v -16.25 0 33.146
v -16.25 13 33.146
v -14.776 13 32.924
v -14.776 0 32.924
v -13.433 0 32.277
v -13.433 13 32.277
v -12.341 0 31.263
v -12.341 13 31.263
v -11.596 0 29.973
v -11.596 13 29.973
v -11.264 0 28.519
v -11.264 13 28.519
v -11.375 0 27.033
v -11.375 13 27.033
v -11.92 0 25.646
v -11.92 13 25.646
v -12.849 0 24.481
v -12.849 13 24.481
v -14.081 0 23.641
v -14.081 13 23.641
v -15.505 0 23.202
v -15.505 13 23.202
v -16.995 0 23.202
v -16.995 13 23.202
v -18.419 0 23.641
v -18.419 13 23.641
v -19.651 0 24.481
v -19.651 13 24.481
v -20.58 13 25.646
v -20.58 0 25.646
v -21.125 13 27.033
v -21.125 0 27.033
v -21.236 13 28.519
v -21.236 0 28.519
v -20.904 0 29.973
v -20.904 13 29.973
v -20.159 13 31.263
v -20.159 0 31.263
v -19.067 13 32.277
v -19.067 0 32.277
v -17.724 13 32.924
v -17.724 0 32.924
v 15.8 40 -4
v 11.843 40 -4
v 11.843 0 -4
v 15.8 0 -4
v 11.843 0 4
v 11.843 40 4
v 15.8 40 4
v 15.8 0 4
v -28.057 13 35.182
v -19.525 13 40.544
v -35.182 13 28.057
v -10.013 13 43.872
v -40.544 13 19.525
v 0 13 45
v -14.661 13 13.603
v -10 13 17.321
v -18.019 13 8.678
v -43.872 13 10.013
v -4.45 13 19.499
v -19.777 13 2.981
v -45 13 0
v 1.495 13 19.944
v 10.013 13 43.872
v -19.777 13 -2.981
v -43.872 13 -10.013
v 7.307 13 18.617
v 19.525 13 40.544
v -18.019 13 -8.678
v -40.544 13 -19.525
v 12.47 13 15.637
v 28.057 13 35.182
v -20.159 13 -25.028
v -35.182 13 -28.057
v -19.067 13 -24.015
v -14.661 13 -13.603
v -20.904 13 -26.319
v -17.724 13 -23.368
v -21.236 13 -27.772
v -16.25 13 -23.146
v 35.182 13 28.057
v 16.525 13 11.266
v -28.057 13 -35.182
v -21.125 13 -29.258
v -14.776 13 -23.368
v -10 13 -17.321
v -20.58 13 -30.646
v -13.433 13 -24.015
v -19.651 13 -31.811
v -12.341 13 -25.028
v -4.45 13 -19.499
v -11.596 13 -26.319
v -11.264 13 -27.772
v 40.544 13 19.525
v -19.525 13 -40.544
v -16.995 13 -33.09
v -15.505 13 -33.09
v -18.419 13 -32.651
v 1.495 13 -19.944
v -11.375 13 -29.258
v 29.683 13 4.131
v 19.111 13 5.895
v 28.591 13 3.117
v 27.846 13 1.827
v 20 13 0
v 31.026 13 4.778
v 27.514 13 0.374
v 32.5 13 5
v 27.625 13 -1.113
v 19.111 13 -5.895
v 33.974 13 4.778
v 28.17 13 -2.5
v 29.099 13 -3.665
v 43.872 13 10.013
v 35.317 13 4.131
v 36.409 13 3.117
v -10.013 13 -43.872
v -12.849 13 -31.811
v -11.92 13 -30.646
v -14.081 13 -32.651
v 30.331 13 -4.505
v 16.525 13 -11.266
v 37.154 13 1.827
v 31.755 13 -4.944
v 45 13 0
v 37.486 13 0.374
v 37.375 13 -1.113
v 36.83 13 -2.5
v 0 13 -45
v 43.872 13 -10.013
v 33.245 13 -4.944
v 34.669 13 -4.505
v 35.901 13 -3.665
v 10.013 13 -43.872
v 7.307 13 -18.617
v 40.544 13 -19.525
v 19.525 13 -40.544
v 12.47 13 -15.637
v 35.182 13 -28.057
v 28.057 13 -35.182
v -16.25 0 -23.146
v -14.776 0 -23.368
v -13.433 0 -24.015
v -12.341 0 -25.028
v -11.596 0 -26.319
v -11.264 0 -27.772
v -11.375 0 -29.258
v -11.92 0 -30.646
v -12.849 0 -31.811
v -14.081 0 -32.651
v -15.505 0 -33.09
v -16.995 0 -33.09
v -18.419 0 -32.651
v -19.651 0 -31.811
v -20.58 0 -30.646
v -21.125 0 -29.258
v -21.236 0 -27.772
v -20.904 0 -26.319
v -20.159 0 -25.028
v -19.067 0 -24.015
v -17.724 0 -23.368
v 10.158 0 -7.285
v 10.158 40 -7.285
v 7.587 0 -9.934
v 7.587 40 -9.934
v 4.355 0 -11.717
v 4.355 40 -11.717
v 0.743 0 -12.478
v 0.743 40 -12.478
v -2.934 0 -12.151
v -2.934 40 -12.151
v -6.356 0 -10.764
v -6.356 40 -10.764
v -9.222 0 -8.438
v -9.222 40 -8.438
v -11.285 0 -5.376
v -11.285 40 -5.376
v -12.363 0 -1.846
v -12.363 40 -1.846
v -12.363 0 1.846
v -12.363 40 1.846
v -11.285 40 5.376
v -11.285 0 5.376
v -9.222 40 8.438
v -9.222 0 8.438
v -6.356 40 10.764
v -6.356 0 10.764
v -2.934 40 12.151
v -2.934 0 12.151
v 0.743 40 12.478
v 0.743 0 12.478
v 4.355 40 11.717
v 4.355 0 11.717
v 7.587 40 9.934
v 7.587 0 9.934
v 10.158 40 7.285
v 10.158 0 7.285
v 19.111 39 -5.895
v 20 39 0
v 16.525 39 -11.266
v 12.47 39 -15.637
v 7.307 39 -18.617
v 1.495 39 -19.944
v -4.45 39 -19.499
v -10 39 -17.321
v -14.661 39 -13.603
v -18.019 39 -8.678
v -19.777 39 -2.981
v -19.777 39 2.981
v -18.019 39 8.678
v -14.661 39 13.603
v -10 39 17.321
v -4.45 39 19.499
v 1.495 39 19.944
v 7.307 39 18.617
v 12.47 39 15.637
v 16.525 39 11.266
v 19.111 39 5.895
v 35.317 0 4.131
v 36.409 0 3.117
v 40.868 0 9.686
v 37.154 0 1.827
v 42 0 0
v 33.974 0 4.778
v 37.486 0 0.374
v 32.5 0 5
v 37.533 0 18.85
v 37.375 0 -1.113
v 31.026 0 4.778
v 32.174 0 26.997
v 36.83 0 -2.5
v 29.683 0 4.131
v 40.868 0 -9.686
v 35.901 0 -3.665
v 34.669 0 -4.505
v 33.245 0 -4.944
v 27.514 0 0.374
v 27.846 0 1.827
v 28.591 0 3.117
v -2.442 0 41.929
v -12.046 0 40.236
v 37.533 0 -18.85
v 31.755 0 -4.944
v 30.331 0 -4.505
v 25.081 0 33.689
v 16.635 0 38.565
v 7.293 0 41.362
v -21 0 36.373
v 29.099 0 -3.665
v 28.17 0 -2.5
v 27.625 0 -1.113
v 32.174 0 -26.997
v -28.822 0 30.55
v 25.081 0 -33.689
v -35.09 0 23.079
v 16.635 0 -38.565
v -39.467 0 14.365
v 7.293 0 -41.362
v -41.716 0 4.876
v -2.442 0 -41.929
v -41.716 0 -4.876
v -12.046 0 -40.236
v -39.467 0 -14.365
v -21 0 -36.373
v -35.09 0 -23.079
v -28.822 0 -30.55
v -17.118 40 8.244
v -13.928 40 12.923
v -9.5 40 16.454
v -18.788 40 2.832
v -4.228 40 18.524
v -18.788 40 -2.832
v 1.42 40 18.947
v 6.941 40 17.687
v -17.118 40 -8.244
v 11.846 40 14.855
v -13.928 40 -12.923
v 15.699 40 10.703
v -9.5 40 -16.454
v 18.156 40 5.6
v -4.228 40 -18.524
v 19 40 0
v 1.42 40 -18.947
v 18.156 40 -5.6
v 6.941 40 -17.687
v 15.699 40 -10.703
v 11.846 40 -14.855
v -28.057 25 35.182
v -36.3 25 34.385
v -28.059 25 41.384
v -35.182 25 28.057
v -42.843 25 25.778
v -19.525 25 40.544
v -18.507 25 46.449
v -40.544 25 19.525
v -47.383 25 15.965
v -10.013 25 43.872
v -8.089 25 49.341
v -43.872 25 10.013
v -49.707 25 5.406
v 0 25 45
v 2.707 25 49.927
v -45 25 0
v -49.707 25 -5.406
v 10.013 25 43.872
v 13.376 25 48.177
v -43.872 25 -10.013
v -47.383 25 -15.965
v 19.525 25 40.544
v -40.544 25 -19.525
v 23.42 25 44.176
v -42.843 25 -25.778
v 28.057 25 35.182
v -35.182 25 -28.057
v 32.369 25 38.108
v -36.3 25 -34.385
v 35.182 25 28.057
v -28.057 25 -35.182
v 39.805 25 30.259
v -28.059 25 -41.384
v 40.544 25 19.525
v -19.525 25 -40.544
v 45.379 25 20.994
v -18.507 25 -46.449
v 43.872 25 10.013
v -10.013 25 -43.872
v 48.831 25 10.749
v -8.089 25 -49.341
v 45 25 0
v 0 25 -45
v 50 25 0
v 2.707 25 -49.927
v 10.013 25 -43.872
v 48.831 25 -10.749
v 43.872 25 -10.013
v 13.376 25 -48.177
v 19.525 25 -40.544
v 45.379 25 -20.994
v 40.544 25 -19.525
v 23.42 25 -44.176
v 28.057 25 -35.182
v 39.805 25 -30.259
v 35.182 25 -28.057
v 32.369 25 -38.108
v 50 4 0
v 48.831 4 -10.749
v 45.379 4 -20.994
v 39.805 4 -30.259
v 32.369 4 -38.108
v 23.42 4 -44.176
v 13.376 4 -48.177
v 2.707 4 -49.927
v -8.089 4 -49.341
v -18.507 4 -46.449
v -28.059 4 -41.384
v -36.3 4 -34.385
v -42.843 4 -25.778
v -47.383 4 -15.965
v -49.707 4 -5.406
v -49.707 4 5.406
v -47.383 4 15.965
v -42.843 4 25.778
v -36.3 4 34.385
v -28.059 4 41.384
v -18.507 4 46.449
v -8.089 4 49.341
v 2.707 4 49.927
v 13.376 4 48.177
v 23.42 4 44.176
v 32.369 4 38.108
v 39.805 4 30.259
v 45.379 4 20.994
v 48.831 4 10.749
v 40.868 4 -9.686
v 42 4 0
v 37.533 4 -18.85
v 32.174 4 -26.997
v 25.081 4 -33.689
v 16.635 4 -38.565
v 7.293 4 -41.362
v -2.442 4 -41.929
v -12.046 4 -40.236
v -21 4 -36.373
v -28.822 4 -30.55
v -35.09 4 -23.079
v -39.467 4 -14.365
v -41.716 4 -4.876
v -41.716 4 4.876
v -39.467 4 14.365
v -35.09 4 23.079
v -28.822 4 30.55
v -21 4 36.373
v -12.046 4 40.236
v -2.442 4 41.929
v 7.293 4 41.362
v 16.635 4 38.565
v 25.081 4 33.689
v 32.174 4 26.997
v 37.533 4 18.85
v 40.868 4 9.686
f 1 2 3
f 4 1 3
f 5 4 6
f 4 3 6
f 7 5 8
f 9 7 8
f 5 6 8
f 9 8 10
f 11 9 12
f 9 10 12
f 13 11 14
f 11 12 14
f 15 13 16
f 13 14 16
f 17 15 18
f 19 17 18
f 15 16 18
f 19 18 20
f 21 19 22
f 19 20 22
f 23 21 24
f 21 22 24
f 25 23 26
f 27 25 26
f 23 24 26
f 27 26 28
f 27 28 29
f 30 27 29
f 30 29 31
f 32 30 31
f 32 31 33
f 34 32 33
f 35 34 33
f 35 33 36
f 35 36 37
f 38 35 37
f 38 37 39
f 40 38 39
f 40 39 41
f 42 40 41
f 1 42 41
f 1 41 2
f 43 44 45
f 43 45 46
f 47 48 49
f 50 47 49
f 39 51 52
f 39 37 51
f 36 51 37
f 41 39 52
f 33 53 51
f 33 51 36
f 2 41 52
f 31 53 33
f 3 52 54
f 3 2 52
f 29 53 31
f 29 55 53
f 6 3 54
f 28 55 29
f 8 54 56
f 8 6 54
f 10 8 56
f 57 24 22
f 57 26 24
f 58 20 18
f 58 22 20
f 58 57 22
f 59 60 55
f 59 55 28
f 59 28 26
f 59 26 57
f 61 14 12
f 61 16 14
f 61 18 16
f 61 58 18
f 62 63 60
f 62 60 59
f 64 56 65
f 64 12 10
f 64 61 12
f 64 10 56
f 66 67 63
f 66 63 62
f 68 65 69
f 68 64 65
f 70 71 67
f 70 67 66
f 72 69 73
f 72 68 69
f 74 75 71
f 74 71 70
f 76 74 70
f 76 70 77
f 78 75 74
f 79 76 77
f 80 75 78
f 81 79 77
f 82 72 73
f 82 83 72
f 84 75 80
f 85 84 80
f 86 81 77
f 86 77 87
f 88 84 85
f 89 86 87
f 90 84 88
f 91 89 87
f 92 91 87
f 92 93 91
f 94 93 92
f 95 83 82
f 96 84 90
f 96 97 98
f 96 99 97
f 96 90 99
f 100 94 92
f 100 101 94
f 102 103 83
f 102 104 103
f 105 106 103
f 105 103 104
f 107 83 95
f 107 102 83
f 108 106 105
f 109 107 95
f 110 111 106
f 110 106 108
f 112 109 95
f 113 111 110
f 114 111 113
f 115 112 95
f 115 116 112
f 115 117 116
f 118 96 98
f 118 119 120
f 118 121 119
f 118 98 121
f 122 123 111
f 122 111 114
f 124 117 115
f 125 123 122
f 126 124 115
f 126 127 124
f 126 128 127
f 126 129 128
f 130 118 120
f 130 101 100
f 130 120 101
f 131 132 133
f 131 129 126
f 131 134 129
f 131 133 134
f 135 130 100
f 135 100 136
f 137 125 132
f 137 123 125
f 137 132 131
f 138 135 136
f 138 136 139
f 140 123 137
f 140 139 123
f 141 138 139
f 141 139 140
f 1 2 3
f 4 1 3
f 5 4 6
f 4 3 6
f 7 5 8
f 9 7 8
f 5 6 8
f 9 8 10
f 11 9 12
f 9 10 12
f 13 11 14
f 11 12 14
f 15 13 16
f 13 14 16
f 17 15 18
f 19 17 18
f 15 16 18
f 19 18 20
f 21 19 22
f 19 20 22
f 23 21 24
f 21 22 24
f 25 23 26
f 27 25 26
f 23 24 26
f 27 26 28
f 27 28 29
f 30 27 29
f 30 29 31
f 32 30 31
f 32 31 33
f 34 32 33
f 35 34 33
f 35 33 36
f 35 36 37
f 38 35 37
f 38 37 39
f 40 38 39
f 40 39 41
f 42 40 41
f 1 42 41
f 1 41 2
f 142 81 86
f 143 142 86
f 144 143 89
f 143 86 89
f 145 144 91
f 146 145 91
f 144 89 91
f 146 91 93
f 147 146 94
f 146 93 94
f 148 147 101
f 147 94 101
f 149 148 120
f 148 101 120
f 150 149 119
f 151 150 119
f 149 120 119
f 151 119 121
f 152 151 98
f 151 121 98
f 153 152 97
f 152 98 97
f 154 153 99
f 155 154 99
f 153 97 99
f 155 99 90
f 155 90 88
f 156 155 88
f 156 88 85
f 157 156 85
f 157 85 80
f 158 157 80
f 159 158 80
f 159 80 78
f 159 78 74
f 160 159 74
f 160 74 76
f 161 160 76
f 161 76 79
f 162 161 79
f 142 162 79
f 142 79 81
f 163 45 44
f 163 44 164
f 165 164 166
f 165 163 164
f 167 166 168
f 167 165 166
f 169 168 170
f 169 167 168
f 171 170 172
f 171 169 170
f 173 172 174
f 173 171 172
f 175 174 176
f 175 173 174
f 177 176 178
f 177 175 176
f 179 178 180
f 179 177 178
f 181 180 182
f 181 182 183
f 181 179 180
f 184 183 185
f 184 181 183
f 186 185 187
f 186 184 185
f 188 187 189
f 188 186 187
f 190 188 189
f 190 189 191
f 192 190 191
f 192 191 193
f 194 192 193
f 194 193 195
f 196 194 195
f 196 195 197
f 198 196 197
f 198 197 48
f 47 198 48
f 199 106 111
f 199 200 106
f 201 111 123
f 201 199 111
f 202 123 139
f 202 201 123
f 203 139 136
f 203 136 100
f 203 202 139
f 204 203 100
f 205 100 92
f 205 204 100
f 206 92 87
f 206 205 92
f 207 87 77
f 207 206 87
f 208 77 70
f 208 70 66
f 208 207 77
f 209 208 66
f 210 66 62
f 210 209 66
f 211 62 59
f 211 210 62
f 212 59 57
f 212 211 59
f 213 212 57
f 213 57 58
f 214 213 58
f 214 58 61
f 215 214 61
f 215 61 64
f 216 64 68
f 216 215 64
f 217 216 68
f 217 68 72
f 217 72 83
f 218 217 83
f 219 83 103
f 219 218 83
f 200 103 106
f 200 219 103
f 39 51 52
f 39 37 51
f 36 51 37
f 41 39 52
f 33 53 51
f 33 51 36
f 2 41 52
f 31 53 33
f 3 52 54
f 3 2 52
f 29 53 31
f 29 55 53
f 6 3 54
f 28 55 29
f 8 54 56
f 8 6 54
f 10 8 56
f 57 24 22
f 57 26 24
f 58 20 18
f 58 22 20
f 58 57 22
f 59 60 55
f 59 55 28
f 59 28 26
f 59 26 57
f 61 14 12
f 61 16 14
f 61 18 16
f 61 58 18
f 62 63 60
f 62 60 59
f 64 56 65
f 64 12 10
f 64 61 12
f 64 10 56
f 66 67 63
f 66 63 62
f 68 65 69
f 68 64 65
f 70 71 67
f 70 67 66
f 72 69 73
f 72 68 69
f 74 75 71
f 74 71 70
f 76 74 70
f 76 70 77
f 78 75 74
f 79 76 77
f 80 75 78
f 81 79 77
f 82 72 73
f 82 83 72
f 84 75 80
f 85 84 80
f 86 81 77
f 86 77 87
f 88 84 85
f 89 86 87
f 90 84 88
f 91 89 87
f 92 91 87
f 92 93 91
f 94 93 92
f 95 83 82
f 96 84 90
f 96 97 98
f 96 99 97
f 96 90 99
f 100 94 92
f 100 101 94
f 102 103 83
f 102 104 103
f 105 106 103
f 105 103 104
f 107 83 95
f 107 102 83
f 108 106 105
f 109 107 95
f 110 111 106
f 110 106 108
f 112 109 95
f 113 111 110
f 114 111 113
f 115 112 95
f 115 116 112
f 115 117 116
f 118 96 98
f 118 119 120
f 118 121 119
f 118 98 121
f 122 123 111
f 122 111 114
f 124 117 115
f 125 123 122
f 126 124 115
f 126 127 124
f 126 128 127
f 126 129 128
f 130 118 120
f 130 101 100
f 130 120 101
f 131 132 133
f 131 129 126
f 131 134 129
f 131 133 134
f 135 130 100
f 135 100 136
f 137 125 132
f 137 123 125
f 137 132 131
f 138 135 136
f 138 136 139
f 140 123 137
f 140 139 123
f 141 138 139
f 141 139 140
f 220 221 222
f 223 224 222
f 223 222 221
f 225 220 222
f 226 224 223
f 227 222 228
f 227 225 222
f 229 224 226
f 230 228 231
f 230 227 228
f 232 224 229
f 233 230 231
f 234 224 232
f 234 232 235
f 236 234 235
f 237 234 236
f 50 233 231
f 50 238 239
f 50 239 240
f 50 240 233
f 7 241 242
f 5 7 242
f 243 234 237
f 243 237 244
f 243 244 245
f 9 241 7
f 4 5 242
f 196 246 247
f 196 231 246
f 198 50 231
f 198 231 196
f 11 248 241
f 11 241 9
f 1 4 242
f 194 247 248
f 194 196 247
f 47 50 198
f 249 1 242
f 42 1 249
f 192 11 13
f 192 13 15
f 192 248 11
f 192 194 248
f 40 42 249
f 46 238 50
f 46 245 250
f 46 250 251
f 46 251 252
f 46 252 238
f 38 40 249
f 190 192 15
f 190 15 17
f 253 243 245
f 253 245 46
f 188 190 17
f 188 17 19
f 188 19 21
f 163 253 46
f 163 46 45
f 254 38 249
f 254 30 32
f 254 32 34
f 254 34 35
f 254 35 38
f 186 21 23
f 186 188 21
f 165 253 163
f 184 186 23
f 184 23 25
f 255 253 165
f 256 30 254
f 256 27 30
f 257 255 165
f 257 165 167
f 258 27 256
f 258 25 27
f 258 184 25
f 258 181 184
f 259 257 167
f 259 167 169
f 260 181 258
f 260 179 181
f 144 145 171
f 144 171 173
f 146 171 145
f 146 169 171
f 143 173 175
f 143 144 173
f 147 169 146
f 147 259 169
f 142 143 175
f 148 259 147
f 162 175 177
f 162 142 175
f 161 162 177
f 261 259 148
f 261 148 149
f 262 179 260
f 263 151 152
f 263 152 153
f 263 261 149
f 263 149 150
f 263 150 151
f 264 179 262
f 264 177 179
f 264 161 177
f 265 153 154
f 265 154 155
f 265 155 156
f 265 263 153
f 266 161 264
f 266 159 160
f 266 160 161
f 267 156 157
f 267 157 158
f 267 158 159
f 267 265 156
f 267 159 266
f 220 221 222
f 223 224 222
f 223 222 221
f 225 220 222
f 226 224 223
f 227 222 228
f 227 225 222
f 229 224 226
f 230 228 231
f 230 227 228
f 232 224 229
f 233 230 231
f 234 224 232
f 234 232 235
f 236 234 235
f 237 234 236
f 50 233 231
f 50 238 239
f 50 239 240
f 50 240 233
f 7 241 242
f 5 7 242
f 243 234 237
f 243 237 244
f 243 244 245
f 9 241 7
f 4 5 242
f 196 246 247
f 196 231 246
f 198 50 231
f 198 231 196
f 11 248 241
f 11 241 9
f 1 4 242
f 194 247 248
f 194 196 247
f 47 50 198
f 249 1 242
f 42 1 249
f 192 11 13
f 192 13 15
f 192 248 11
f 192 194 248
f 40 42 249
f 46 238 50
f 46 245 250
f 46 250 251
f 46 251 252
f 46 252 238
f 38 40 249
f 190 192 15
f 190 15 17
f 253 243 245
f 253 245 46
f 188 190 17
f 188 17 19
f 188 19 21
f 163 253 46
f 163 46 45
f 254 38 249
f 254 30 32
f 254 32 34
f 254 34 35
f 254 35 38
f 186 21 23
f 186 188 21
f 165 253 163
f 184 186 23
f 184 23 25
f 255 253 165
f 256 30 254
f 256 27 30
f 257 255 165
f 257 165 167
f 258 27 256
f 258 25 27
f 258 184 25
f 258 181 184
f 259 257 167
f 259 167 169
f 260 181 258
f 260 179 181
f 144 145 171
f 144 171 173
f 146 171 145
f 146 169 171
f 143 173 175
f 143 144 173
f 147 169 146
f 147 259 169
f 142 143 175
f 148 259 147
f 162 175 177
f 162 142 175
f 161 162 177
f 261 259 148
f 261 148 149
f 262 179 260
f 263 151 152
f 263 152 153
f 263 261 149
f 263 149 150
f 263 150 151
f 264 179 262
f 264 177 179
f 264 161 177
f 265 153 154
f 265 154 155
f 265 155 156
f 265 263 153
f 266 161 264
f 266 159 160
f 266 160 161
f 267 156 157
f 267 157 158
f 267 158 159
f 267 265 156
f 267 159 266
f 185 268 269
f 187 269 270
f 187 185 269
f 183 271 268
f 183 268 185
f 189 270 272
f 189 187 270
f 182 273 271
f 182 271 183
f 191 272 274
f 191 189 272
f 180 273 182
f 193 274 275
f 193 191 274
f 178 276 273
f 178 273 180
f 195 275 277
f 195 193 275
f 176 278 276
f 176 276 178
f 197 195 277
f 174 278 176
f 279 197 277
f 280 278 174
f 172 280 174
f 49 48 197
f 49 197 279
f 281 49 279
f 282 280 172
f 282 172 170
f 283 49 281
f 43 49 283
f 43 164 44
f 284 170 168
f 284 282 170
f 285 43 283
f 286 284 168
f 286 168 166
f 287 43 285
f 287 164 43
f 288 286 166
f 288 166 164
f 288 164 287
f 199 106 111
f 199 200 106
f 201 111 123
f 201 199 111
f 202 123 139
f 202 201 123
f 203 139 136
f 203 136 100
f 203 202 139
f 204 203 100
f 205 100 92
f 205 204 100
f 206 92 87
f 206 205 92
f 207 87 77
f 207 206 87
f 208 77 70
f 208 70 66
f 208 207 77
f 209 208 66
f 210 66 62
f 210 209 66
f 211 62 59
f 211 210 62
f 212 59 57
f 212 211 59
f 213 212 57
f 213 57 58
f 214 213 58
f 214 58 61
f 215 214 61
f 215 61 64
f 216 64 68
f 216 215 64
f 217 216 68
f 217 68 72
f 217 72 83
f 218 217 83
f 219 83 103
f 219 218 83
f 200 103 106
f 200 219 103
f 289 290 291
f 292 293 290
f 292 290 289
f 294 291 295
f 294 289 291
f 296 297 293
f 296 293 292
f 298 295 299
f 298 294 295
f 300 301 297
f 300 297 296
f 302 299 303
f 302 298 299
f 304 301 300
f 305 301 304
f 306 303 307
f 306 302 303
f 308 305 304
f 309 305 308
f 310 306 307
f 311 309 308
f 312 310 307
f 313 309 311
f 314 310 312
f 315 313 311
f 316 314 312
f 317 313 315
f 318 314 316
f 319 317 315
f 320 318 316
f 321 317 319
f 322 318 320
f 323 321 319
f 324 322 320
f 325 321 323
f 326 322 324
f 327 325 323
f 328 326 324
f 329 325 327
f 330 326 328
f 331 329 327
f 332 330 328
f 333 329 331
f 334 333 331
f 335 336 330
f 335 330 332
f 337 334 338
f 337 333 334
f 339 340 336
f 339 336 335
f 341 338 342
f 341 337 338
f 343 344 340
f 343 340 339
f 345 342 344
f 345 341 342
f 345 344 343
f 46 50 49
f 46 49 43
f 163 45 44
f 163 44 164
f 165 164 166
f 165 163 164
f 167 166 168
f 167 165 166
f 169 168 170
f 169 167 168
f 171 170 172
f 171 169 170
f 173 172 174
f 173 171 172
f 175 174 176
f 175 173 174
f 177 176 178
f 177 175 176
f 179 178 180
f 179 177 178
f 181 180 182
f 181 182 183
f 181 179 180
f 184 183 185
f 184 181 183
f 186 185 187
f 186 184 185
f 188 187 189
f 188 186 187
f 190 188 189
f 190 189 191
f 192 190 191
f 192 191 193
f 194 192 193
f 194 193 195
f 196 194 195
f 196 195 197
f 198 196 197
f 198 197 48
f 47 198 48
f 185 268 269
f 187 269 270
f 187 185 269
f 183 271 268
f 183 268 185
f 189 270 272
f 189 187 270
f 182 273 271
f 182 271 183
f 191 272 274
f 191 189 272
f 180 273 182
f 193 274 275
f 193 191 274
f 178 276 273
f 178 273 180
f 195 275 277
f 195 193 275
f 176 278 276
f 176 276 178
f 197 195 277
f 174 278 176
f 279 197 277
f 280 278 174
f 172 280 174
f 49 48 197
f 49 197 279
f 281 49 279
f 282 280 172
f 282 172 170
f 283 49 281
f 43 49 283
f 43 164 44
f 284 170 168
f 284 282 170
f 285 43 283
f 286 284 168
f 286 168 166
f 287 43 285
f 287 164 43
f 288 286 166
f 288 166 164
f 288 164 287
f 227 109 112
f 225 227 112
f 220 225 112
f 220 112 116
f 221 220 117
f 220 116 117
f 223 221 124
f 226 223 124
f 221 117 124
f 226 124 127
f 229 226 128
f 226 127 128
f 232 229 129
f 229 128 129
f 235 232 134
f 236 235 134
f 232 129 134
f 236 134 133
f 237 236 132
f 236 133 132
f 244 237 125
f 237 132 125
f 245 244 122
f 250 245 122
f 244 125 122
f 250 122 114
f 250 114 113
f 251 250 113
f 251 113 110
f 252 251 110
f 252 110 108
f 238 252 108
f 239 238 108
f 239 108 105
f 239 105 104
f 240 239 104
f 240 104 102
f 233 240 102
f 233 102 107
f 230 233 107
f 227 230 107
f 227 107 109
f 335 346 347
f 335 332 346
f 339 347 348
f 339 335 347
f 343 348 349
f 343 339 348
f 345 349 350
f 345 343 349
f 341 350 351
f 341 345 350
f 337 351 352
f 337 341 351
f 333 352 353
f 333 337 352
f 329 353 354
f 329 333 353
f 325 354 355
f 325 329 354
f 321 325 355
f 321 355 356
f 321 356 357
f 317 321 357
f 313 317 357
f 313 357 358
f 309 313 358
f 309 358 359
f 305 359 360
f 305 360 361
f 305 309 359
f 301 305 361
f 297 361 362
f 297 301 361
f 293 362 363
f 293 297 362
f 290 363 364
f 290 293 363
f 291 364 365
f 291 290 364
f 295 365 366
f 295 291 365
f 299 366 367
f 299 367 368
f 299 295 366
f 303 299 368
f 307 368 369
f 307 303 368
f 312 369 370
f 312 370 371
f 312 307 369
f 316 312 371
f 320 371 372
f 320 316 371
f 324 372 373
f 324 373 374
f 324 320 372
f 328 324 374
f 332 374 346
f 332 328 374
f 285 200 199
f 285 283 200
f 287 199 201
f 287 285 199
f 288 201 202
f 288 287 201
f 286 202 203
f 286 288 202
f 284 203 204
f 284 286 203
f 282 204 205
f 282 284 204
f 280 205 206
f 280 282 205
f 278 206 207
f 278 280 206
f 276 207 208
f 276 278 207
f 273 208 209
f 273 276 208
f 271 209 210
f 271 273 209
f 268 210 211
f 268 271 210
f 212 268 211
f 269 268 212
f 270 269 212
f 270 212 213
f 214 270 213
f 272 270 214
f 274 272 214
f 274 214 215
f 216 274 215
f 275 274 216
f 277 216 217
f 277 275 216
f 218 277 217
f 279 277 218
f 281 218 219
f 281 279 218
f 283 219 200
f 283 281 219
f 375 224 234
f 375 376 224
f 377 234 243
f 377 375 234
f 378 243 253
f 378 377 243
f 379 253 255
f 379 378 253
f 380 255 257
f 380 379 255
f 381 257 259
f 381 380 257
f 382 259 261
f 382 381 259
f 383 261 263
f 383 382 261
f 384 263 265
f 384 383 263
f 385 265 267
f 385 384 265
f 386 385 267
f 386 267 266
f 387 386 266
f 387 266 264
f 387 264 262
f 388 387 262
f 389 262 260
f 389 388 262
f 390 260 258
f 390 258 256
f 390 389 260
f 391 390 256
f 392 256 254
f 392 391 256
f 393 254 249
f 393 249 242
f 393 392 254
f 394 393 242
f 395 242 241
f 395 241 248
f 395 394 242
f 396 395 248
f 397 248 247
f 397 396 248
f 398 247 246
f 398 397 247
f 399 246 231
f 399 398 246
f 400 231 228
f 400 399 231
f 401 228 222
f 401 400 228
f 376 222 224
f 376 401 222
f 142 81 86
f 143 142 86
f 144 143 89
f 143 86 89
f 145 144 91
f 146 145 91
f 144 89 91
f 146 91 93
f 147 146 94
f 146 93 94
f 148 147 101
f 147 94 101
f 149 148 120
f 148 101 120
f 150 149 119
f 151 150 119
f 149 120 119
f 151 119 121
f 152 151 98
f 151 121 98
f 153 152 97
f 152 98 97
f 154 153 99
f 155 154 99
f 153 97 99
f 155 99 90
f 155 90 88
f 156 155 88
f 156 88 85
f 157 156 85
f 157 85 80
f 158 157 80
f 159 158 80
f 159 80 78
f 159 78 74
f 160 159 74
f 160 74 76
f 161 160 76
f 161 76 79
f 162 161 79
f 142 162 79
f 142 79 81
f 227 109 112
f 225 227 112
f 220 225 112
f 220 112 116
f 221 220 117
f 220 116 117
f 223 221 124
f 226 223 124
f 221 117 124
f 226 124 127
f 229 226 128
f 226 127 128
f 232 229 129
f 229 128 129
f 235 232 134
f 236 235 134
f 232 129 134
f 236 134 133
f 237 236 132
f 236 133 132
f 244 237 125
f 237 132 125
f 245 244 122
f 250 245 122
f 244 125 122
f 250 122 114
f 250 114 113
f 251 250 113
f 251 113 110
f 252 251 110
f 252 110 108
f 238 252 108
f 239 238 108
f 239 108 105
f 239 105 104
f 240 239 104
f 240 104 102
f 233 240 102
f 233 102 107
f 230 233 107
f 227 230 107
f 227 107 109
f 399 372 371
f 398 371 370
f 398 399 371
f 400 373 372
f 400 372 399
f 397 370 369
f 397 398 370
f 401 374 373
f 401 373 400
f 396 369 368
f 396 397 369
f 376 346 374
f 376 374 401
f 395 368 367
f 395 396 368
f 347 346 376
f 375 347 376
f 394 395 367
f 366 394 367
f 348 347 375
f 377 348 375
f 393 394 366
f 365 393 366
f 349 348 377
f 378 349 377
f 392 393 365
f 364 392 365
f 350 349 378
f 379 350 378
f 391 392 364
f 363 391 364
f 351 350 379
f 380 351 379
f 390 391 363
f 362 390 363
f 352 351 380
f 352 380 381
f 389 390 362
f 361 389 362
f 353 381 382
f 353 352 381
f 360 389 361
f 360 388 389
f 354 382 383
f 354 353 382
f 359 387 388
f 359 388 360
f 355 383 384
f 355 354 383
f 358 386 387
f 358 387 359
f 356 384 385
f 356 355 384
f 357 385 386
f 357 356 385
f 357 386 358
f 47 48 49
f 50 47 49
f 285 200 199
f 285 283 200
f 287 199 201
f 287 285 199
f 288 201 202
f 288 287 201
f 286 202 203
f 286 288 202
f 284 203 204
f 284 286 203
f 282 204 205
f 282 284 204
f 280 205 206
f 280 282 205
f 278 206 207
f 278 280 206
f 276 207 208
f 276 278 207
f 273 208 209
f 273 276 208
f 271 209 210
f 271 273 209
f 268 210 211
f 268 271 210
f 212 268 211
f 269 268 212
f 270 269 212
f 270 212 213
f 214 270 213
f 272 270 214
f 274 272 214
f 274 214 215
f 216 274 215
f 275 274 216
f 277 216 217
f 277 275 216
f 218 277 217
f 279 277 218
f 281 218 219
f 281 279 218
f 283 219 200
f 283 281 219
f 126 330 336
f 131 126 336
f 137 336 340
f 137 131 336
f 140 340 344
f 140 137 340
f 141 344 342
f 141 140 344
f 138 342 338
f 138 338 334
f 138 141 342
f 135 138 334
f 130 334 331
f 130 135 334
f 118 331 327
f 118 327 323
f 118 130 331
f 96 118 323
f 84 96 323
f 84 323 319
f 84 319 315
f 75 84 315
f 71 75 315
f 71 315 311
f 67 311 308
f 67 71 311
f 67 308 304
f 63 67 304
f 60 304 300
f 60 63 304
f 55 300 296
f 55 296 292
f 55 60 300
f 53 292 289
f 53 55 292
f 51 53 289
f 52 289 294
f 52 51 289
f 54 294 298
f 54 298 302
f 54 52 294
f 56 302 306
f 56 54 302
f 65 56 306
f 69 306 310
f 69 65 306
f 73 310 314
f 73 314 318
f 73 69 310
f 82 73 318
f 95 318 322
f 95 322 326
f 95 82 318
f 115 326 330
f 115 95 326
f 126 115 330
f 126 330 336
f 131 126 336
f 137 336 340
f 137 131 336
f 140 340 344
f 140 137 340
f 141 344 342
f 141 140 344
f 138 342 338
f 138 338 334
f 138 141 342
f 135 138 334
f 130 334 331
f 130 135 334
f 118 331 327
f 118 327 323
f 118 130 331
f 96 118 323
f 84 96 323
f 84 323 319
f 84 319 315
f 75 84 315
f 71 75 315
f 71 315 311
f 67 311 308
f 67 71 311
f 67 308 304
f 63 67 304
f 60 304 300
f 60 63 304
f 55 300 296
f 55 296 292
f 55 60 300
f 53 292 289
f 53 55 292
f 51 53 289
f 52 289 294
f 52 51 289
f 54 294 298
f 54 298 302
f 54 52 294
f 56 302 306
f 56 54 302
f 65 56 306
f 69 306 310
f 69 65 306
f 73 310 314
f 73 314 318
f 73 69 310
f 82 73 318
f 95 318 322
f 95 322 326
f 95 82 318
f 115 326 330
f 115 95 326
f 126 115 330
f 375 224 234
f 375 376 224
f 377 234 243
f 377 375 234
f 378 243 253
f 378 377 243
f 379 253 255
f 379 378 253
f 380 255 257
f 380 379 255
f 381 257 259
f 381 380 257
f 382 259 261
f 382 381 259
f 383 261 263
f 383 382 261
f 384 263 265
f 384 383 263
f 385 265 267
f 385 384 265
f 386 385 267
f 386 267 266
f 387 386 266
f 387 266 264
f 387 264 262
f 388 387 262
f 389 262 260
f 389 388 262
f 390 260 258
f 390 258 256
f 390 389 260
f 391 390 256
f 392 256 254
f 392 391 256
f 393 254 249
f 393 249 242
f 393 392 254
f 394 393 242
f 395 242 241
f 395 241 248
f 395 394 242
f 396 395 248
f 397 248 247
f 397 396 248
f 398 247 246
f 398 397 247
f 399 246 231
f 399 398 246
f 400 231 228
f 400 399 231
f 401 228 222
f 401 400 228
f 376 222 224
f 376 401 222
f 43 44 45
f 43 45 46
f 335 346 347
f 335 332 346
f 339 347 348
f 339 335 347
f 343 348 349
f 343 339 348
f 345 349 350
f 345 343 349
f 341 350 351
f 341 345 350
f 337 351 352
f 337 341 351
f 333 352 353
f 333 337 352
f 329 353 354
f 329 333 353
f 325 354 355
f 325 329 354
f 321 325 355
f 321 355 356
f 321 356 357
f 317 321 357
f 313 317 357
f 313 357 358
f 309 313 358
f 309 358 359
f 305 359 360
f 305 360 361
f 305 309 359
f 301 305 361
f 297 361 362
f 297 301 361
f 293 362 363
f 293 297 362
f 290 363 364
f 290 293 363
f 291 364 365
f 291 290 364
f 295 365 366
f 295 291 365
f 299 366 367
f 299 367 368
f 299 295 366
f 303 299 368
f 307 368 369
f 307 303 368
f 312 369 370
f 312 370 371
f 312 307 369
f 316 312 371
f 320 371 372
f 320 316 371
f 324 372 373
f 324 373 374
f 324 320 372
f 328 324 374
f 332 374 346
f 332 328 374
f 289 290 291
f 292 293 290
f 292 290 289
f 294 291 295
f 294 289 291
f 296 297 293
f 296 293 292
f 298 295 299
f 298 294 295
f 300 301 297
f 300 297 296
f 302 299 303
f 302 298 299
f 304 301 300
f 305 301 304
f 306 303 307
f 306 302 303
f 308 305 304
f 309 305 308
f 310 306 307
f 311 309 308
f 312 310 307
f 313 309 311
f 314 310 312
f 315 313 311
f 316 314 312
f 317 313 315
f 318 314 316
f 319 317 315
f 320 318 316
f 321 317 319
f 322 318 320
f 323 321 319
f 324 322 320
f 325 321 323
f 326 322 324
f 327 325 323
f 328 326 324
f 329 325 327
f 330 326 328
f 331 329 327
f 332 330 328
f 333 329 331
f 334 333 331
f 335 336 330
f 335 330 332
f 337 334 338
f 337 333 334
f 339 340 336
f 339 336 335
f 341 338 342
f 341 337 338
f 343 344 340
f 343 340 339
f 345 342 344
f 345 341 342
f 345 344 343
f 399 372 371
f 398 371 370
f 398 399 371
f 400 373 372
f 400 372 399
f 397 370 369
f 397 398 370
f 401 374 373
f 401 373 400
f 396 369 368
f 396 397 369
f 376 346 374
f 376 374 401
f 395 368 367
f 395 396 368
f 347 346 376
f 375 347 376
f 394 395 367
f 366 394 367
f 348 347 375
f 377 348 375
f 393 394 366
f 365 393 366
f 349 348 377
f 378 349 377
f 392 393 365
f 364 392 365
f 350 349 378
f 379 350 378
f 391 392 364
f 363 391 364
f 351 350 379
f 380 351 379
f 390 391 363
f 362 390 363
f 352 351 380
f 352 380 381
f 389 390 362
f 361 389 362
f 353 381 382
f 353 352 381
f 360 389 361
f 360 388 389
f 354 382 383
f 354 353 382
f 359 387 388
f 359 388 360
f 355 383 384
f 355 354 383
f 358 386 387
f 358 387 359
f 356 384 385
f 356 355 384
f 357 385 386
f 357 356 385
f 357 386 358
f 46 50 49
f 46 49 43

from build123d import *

# Parameters (mm, degrees)
SKETCH_2_W          = 6.6
SKETCH_2_H          = 8
CUT_EXTRUDE_1_DEPTH = 82.240384046
SKETCH_3_R          = 5
CUT_EXTRUDE_2_DEPTH = 76.690157881


# Read off the part's stored shape, not the designer's step: 旋转1
with BuildPart() as part:
    # 旋转1 outline → 旋转1 (revolve)
    with BuildSketch(Plane.XY):
        Polygon((45, 13), (20, 13), (20, 39), (19, 40), (12.5, 40), (12.5, 0), (42, 0), (42, 4), (50, 4), (50, 25), (45, 25), align=None)
    revolve(axis=Axis((0, 0, 0), (0, 1, 0)))


with BuildPart() as body_2:
    # Revolve 1 2 outline → Revolve 1 2 (revolve)
    with BuildSketch(Plane.XY):
        Polygon((12.5, 40), (12.5, 0), (42, 0), (42, 4), (50, 4), (50, 25), (45, 25), (45, 13), (20, 13), (20, 39), (19, 40), align=None)
    revolve(axis=Axis((0, 0, 0), (0, 1, 0)))


with BuildPart() as cut_extrude_1_tool:
    # 草图2 → 切除-拉伸1 (new, through all)
    with BuildSketch(Plane(origin=(0, 40, 0), x_dir=(1, 0, 0), z_dir=(0, 1, 0))):
        with Locations((12.5, 0)):
            Rectangle(SKETCH_2_W, SKETCH_2_H)
    extrude(amount=-CUT_EXTRUDE_1_DEPTH)


with BuildPart() as part_1:
    add(part.part)

    # 切除-拉伸1: cut by cut_extrude_1_tool
    add(cut_extrude_1_tool.part, mode=Mode.SUBTRACT)


with BuildPart() as body_2_1:
    add(body_2.part)

    # 切除-拉伸1: cut by cut_extrude_1_tool
    add(cut_extrude_1_tool.part, mode=Mode.SUBTRACT)


with BuildPart() as cut_extrude_2_tool:
    # 草图3 → 切除-拉伸2 (new, through all)
    with BuildSketch(Plane(origin=(0, 13, 0), x_dir=(1, 0, 0), z_dir=(0, 1, 0))):
        with Locations(Location((32.5, 0, 0), (0, 0, 270))):
            Circle(SKETCH_3_R)
        with Locations(Location((-16.25, -28.145825623, 0), (0, 0, 270))):
            Circle(SKETCH_3_R)
        with Locations(Location((-16.25, 28.145825623, 0), (0, 0, 270))):
            Circle(SKETCH_3_R)
    extrude(amount=-CUT_EXTRUDE_2_DEPTH)


with BuildPart() as part_2:
    add(part_1.part)

    # 切除-拉伸2: cut by cut_extrude_2_tool
    add(cut_extrude_2_tool.part, mode=Mode.SUBTRACT)


with BuildPart() as body_2_2:
    add(body_2_1.part)

    # 切除-拉伸2: cut by cut_extrude_2_tool
    add(cut_extrude_2_tool.part, mode=Mode.SUBTRACT)


solid = Compound([part_2.part, body_2_2.part])
